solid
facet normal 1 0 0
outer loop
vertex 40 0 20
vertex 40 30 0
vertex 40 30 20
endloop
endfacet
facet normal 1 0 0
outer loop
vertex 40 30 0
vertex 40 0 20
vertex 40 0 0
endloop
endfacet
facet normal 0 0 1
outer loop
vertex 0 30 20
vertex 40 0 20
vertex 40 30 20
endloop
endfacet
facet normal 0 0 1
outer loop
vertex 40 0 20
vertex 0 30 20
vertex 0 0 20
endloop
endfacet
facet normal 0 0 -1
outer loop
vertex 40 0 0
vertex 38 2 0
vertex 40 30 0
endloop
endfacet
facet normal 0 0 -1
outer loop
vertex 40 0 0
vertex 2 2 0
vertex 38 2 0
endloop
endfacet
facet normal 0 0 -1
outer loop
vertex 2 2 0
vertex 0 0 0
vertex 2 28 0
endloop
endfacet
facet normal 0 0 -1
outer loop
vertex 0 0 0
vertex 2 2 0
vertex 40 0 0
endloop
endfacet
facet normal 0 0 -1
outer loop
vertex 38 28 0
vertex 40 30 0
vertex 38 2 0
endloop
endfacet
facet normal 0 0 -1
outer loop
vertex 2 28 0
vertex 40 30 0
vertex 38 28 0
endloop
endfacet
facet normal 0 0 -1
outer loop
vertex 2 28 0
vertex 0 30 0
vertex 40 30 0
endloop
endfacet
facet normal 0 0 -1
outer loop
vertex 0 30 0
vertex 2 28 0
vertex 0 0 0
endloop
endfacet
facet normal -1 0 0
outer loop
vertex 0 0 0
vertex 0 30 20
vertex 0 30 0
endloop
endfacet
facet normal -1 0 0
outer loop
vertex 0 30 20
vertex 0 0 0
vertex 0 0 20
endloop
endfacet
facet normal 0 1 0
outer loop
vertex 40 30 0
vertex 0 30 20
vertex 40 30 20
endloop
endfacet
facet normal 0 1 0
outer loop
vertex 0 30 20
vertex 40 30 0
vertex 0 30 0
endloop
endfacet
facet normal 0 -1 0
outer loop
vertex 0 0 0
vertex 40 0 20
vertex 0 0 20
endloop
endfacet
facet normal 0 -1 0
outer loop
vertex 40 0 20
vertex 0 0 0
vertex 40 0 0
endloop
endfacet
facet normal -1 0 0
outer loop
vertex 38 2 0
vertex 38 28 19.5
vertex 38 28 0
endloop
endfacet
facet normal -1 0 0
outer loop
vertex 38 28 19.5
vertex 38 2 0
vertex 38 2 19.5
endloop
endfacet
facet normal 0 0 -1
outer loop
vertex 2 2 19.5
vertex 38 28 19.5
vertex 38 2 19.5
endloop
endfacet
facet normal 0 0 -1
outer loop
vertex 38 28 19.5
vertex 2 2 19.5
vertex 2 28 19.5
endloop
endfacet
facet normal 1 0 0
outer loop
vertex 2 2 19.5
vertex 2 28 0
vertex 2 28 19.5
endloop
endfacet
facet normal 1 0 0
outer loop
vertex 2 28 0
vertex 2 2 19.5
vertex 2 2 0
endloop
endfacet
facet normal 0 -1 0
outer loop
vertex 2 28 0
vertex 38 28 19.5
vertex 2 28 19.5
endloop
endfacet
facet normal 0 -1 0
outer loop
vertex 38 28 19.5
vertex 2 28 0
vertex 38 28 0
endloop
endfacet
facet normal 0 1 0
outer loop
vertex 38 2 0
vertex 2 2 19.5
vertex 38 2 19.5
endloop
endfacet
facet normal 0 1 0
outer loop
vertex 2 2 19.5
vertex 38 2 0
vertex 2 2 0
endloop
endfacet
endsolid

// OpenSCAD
// units=mm — generated by scad_emitter.py
// part=unnamed
$fn = 48;

difference() { cube([40, 30, 20]); translate([2, 2, -0.5]) cube([36, 26, 20]); }
